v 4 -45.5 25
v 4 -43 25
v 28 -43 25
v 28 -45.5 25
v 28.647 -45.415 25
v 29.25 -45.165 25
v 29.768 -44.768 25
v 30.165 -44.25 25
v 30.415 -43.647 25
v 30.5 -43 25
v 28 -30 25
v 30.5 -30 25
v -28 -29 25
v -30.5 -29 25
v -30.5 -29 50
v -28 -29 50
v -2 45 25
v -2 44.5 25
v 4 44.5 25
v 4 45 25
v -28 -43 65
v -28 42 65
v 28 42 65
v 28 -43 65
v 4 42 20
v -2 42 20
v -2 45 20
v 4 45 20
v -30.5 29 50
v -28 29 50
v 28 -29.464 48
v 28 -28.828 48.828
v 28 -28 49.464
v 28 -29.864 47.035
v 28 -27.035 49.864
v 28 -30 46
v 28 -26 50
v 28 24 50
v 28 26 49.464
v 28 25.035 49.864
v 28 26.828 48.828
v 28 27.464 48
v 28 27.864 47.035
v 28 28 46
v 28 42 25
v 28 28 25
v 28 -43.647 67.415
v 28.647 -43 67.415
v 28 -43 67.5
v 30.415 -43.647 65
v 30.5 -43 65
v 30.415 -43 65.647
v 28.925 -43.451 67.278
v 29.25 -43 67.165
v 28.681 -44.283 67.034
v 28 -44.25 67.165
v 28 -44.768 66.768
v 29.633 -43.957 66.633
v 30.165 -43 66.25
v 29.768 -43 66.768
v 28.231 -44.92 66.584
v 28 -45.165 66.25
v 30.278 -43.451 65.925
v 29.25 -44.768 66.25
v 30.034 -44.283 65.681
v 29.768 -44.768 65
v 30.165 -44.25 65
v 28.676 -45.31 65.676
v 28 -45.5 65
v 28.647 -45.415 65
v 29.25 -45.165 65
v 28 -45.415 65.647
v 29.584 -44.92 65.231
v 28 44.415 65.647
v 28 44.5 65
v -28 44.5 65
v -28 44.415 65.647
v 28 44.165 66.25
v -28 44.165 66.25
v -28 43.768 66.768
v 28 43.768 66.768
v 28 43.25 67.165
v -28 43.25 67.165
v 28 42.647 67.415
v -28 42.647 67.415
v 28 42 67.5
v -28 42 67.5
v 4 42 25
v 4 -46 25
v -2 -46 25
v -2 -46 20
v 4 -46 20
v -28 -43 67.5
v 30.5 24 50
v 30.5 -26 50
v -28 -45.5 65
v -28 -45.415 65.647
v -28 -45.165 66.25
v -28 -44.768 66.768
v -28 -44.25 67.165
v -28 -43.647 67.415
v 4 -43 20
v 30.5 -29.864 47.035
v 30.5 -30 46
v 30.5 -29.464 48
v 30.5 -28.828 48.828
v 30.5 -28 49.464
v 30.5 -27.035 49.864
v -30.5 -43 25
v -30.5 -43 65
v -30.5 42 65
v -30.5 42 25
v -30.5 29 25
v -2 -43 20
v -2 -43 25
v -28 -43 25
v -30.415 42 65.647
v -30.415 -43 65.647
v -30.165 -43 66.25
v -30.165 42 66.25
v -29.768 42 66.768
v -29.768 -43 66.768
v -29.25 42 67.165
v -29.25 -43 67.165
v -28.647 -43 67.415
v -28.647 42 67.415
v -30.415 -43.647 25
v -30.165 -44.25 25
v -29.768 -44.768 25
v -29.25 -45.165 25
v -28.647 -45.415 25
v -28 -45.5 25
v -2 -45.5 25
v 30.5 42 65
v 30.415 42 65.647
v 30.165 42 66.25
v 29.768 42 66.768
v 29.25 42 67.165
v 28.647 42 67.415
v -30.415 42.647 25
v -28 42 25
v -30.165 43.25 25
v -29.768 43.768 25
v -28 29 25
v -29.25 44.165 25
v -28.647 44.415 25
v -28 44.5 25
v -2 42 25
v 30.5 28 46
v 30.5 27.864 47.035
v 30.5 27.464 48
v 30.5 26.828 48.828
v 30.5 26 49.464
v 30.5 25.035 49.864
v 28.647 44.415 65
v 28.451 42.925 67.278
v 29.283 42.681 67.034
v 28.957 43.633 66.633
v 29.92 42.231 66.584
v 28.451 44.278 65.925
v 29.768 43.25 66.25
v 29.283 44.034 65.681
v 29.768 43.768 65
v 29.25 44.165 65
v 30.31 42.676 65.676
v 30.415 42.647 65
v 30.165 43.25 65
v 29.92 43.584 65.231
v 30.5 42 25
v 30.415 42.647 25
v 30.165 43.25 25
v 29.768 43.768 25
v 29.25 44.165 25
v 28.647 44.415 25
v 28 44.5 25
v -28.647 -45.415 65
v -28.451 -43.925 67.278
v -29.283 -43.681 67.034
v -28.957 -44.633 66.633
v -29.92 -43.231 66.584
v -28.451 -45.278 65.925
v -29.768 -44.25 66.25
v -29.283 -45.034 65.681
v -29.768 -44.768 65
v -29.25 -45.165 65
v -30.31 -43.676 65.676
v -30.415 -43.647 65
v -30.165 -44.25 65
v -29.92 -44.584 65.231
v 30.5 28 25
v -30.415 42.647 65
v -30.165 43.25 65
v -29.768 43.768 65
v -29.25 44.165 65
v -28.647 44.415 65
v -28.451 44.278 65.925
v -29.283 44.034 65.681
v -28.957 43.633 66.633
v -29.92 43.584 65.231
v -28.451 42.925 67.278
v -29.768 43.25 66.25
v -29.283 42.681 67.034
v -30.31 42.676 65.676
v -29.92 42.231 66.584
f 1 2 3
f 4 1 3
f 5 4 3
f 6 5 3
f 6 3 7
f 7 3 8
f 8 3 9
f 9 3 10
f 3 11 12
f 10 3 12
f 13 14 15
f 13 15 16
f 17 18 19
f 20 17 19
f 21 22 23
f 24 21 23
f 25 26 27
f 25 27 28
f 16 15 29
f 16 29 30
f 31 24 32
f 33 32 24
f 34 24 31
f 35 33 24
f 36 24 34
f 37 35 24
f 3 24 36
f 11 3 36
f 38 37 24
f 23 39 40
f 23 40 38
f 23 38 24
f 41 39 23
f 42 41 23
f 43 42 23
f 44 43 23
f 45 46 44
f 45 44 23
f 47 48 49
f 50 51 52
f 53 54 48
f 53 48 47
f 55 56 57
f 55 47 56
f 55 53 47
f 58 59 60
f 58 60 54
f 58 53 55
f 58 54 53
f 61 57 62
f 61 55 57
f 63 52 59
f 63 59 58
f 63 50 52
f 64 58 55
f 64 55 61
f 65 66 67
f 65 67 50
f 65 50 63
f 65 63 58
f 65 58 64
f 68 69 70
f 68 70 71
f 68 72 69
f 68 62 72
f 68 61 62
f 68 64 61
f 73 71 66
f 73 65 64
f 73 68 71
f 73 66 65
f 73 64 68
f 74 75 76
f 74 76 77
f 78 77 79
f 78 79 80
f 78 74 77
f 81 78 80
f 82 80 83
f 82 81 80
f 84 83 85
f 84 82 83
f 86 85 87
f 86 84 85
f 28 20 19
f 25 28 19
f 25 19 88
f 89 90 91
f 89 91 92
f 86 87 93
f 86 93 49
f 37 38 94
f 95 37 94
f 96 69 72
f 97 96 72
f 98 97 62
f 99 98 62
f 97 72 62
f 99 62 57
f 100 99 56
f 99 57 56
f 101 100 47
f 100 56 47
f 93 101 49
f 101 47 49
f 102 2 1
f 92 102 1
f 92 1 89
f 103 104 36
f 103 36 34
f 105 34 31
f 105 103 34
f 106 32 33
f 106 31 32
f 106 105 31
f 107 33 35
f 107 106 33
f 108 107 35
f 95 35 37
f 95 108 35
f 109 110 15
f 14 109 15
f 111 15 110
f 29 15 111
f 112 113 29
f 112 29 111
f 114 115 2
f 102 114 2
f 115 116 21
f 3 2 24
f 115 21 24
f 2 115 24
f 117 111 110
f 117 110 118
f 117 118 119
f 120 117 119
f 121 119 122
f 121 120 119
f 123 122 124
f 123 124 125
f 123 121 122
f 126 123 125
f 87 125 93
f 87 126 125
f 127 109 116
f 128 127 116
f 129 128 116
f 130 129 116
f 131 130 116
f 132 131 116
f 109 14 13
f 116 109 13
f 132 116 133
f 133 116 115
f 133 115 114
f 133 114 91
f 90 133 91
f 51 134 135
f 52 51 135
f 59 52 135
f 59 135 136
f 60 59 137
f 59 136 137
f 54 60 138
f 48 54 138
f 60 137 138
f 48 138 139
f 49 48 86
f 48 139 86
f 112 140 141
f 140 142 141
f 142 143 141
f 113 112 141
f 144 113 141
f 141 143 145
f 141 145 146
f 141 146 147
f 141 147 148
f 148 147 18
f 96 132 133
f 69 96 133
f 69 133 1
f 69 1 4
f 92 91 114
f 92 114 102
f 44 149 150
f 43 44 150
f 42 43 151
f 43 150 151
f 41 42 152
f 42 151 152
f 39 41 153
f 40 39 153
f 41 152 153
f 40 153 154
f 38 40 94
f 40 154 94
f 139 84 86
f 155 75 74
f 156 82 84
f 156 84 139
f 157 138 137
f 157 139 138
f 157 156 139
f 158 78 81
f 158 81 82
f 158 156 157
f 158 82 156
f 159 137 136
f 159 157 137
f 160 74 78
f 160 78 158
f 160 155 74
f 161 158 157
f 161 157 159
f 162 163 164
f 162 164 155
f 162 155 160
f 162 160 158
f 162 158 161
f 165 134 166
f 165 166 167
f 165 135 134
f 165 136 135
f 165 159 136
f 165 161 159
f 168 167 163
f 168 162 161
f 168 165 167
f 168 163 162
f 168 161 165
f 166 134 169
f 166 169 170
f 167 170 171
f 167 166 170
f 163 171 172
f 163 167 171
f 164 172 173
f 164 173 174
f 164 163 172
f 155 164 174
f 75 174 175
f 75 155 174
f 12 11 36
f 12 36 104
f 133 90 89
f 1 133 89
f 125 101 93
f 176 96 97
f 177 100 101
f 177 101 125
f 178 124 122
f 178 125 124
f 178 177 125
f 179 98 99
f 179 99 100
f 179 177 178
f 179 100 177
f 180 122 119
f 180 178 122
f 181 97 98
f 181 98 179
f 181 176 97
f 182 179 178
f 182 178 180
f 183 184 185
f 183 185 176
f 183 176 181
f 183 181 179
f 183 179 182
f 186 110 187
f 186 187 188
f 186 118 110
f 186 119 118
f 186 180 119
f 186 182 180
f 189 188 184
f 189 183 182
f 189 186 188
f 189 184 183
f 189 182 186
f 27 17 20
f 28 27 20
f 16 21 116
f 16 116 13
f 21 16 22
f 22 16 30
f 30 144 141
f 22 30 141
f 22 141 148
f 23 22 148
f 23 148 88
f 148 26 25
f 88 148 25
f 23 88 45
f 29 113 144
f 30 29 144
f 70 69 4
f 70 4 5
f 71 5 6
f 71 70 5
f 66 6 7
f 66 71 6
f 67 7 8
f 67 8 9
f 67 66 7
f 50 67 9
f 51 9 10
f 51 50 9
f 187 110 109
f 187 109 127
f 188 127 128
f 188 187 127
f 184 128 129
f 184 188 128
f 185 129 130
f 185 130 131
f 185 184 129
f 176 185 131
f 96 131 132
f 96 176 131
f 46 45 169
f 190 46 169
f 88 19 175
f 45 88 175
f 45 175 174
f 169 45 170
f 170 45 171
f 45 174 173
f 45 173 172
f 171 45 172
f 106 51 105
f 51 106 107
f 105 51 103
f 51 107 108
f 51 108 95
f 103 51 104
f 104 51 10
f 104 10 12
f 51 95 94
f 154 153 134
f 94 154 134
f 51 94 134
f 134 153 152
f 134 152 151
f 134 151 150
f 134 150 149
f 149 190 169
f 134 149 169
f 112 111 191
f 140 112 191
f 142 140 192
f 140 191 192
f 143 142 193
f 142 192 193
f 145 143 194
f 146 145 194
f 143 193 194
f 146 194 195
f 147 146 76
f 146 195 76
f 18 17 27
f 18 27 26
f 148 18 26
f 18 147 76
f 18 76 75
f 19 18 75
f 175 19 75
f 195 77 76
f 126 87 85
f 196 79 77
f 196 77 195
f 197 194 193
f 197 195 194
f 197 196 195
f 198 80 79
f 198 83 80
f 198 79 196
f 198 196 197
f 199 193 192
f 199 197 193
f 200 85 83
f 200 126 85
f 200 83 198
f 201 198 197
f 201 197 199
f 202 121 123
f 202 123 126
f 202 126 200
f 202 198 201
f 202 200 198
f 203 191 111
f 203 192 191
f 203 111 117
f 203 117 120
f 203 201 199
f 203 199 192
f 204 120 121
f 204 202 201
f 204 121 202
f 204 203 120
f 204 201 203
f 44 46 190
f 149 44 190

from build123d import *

# Parameters (mm, degrees)
BOX038_W     = 10
BOX038_H     = 58
BOX038_DEPTH = 25
FILLET007_R  = 4
BOX035_W     = 10
BOX035_H     = 58
BOX035_DEPTH = 25
BOX034_W     = 56
BOX034_H     = 85
BOX034_DEPTH = 40
THICKNESS_T  = 2.5
SKETCH_W     = 6
SKETCH_H     = 3
PAD006_DEPTH = 5


with BuildPart() as fillet007:
    # Box038 → Box038 (new body)
    with BuildSketch(Plane(origin=(23, -30, 25), x_dir=(1, 0, 0), z_dir=(0, 0, 1))):
        with Locations((5, 29)):
            Rectangle(BOX038_W, BOX038_H)
    extrude(amount=BOX038_DEPTH)

    # Fillet007
    fillet007_edges = [fillet007.edges().sort_by_distance(p)[0] for p in [
        (28, -30, 50),
        (28, 28, 50),
    ]]
    fillet(fillet007_edges, radius=FILLET007_R)


with BuildPart() as cubo029:
    # Box035 → Box035 (new body)
    with BuildSketch(Plane(origin=(-36, -30, 25), x_dir=(1, 0, 0), z_dir=(0, 0, 1))):
        with Locations((5, 29)):
            Rectangle(BOX035_W, BOX035_H)
    extrude(amount=BOX035_DEPTH)


with BuildPart() as cubiertarobot:
    # Box034 → Box034 (new body)
    with BuildSketch(Plane(origin=(-31, -46, 38), x_dir=(1, 0, 0), z_dir=(0, 0, 1))):
        with Locations((28, 42.5)):
            Rectangle(BOX034_W, BOX034_H)
    extrude(amount=BOX034_DEPTH)

    # Thickness
    thickness_openings = [cubiertarobot.faces().sort_by_distance(p)[0] for p in [
        (-3, -3.5, 38),
    ]]
    offset(amount=THICKNESS_T, openings=thickness_openings)


with BuildPart() as cubiertarobot_1:
    # Thickness placement: moved
    add(cubiertarobot.part.moved(Location((2, 2, -13))))

    # Cut045: cut Cubo029
    add(cubo029.part, mode=Mode.SUBTRACT)


with BuildPart() as cubiertarobot_2:
    # Cut045 placement: moved
    add(cubiertarobot_1.part.moved(Location((1, 1, 0))))

    # Sketch → Pad006 (new body)
    with BuildSketch(Plane(origin=(1, 1, 25), x_dir=(1, 0, 0), z_dir=(0, 0, -1))):
        with Locations((0, 45.5)):
            Rectangle(SKETCH_W, SKETCH_H)
        with Locations((0, -42.5)):
            Rectangle(SKETCH_W, SKETCH_H)
    extrude(amount=PAD006_DEPTH)

    # Cut048: cut Fillet007
    add(fillet007.part, mode=Mode.SUBTRACT)


solid = cubiertarobot_2.part
